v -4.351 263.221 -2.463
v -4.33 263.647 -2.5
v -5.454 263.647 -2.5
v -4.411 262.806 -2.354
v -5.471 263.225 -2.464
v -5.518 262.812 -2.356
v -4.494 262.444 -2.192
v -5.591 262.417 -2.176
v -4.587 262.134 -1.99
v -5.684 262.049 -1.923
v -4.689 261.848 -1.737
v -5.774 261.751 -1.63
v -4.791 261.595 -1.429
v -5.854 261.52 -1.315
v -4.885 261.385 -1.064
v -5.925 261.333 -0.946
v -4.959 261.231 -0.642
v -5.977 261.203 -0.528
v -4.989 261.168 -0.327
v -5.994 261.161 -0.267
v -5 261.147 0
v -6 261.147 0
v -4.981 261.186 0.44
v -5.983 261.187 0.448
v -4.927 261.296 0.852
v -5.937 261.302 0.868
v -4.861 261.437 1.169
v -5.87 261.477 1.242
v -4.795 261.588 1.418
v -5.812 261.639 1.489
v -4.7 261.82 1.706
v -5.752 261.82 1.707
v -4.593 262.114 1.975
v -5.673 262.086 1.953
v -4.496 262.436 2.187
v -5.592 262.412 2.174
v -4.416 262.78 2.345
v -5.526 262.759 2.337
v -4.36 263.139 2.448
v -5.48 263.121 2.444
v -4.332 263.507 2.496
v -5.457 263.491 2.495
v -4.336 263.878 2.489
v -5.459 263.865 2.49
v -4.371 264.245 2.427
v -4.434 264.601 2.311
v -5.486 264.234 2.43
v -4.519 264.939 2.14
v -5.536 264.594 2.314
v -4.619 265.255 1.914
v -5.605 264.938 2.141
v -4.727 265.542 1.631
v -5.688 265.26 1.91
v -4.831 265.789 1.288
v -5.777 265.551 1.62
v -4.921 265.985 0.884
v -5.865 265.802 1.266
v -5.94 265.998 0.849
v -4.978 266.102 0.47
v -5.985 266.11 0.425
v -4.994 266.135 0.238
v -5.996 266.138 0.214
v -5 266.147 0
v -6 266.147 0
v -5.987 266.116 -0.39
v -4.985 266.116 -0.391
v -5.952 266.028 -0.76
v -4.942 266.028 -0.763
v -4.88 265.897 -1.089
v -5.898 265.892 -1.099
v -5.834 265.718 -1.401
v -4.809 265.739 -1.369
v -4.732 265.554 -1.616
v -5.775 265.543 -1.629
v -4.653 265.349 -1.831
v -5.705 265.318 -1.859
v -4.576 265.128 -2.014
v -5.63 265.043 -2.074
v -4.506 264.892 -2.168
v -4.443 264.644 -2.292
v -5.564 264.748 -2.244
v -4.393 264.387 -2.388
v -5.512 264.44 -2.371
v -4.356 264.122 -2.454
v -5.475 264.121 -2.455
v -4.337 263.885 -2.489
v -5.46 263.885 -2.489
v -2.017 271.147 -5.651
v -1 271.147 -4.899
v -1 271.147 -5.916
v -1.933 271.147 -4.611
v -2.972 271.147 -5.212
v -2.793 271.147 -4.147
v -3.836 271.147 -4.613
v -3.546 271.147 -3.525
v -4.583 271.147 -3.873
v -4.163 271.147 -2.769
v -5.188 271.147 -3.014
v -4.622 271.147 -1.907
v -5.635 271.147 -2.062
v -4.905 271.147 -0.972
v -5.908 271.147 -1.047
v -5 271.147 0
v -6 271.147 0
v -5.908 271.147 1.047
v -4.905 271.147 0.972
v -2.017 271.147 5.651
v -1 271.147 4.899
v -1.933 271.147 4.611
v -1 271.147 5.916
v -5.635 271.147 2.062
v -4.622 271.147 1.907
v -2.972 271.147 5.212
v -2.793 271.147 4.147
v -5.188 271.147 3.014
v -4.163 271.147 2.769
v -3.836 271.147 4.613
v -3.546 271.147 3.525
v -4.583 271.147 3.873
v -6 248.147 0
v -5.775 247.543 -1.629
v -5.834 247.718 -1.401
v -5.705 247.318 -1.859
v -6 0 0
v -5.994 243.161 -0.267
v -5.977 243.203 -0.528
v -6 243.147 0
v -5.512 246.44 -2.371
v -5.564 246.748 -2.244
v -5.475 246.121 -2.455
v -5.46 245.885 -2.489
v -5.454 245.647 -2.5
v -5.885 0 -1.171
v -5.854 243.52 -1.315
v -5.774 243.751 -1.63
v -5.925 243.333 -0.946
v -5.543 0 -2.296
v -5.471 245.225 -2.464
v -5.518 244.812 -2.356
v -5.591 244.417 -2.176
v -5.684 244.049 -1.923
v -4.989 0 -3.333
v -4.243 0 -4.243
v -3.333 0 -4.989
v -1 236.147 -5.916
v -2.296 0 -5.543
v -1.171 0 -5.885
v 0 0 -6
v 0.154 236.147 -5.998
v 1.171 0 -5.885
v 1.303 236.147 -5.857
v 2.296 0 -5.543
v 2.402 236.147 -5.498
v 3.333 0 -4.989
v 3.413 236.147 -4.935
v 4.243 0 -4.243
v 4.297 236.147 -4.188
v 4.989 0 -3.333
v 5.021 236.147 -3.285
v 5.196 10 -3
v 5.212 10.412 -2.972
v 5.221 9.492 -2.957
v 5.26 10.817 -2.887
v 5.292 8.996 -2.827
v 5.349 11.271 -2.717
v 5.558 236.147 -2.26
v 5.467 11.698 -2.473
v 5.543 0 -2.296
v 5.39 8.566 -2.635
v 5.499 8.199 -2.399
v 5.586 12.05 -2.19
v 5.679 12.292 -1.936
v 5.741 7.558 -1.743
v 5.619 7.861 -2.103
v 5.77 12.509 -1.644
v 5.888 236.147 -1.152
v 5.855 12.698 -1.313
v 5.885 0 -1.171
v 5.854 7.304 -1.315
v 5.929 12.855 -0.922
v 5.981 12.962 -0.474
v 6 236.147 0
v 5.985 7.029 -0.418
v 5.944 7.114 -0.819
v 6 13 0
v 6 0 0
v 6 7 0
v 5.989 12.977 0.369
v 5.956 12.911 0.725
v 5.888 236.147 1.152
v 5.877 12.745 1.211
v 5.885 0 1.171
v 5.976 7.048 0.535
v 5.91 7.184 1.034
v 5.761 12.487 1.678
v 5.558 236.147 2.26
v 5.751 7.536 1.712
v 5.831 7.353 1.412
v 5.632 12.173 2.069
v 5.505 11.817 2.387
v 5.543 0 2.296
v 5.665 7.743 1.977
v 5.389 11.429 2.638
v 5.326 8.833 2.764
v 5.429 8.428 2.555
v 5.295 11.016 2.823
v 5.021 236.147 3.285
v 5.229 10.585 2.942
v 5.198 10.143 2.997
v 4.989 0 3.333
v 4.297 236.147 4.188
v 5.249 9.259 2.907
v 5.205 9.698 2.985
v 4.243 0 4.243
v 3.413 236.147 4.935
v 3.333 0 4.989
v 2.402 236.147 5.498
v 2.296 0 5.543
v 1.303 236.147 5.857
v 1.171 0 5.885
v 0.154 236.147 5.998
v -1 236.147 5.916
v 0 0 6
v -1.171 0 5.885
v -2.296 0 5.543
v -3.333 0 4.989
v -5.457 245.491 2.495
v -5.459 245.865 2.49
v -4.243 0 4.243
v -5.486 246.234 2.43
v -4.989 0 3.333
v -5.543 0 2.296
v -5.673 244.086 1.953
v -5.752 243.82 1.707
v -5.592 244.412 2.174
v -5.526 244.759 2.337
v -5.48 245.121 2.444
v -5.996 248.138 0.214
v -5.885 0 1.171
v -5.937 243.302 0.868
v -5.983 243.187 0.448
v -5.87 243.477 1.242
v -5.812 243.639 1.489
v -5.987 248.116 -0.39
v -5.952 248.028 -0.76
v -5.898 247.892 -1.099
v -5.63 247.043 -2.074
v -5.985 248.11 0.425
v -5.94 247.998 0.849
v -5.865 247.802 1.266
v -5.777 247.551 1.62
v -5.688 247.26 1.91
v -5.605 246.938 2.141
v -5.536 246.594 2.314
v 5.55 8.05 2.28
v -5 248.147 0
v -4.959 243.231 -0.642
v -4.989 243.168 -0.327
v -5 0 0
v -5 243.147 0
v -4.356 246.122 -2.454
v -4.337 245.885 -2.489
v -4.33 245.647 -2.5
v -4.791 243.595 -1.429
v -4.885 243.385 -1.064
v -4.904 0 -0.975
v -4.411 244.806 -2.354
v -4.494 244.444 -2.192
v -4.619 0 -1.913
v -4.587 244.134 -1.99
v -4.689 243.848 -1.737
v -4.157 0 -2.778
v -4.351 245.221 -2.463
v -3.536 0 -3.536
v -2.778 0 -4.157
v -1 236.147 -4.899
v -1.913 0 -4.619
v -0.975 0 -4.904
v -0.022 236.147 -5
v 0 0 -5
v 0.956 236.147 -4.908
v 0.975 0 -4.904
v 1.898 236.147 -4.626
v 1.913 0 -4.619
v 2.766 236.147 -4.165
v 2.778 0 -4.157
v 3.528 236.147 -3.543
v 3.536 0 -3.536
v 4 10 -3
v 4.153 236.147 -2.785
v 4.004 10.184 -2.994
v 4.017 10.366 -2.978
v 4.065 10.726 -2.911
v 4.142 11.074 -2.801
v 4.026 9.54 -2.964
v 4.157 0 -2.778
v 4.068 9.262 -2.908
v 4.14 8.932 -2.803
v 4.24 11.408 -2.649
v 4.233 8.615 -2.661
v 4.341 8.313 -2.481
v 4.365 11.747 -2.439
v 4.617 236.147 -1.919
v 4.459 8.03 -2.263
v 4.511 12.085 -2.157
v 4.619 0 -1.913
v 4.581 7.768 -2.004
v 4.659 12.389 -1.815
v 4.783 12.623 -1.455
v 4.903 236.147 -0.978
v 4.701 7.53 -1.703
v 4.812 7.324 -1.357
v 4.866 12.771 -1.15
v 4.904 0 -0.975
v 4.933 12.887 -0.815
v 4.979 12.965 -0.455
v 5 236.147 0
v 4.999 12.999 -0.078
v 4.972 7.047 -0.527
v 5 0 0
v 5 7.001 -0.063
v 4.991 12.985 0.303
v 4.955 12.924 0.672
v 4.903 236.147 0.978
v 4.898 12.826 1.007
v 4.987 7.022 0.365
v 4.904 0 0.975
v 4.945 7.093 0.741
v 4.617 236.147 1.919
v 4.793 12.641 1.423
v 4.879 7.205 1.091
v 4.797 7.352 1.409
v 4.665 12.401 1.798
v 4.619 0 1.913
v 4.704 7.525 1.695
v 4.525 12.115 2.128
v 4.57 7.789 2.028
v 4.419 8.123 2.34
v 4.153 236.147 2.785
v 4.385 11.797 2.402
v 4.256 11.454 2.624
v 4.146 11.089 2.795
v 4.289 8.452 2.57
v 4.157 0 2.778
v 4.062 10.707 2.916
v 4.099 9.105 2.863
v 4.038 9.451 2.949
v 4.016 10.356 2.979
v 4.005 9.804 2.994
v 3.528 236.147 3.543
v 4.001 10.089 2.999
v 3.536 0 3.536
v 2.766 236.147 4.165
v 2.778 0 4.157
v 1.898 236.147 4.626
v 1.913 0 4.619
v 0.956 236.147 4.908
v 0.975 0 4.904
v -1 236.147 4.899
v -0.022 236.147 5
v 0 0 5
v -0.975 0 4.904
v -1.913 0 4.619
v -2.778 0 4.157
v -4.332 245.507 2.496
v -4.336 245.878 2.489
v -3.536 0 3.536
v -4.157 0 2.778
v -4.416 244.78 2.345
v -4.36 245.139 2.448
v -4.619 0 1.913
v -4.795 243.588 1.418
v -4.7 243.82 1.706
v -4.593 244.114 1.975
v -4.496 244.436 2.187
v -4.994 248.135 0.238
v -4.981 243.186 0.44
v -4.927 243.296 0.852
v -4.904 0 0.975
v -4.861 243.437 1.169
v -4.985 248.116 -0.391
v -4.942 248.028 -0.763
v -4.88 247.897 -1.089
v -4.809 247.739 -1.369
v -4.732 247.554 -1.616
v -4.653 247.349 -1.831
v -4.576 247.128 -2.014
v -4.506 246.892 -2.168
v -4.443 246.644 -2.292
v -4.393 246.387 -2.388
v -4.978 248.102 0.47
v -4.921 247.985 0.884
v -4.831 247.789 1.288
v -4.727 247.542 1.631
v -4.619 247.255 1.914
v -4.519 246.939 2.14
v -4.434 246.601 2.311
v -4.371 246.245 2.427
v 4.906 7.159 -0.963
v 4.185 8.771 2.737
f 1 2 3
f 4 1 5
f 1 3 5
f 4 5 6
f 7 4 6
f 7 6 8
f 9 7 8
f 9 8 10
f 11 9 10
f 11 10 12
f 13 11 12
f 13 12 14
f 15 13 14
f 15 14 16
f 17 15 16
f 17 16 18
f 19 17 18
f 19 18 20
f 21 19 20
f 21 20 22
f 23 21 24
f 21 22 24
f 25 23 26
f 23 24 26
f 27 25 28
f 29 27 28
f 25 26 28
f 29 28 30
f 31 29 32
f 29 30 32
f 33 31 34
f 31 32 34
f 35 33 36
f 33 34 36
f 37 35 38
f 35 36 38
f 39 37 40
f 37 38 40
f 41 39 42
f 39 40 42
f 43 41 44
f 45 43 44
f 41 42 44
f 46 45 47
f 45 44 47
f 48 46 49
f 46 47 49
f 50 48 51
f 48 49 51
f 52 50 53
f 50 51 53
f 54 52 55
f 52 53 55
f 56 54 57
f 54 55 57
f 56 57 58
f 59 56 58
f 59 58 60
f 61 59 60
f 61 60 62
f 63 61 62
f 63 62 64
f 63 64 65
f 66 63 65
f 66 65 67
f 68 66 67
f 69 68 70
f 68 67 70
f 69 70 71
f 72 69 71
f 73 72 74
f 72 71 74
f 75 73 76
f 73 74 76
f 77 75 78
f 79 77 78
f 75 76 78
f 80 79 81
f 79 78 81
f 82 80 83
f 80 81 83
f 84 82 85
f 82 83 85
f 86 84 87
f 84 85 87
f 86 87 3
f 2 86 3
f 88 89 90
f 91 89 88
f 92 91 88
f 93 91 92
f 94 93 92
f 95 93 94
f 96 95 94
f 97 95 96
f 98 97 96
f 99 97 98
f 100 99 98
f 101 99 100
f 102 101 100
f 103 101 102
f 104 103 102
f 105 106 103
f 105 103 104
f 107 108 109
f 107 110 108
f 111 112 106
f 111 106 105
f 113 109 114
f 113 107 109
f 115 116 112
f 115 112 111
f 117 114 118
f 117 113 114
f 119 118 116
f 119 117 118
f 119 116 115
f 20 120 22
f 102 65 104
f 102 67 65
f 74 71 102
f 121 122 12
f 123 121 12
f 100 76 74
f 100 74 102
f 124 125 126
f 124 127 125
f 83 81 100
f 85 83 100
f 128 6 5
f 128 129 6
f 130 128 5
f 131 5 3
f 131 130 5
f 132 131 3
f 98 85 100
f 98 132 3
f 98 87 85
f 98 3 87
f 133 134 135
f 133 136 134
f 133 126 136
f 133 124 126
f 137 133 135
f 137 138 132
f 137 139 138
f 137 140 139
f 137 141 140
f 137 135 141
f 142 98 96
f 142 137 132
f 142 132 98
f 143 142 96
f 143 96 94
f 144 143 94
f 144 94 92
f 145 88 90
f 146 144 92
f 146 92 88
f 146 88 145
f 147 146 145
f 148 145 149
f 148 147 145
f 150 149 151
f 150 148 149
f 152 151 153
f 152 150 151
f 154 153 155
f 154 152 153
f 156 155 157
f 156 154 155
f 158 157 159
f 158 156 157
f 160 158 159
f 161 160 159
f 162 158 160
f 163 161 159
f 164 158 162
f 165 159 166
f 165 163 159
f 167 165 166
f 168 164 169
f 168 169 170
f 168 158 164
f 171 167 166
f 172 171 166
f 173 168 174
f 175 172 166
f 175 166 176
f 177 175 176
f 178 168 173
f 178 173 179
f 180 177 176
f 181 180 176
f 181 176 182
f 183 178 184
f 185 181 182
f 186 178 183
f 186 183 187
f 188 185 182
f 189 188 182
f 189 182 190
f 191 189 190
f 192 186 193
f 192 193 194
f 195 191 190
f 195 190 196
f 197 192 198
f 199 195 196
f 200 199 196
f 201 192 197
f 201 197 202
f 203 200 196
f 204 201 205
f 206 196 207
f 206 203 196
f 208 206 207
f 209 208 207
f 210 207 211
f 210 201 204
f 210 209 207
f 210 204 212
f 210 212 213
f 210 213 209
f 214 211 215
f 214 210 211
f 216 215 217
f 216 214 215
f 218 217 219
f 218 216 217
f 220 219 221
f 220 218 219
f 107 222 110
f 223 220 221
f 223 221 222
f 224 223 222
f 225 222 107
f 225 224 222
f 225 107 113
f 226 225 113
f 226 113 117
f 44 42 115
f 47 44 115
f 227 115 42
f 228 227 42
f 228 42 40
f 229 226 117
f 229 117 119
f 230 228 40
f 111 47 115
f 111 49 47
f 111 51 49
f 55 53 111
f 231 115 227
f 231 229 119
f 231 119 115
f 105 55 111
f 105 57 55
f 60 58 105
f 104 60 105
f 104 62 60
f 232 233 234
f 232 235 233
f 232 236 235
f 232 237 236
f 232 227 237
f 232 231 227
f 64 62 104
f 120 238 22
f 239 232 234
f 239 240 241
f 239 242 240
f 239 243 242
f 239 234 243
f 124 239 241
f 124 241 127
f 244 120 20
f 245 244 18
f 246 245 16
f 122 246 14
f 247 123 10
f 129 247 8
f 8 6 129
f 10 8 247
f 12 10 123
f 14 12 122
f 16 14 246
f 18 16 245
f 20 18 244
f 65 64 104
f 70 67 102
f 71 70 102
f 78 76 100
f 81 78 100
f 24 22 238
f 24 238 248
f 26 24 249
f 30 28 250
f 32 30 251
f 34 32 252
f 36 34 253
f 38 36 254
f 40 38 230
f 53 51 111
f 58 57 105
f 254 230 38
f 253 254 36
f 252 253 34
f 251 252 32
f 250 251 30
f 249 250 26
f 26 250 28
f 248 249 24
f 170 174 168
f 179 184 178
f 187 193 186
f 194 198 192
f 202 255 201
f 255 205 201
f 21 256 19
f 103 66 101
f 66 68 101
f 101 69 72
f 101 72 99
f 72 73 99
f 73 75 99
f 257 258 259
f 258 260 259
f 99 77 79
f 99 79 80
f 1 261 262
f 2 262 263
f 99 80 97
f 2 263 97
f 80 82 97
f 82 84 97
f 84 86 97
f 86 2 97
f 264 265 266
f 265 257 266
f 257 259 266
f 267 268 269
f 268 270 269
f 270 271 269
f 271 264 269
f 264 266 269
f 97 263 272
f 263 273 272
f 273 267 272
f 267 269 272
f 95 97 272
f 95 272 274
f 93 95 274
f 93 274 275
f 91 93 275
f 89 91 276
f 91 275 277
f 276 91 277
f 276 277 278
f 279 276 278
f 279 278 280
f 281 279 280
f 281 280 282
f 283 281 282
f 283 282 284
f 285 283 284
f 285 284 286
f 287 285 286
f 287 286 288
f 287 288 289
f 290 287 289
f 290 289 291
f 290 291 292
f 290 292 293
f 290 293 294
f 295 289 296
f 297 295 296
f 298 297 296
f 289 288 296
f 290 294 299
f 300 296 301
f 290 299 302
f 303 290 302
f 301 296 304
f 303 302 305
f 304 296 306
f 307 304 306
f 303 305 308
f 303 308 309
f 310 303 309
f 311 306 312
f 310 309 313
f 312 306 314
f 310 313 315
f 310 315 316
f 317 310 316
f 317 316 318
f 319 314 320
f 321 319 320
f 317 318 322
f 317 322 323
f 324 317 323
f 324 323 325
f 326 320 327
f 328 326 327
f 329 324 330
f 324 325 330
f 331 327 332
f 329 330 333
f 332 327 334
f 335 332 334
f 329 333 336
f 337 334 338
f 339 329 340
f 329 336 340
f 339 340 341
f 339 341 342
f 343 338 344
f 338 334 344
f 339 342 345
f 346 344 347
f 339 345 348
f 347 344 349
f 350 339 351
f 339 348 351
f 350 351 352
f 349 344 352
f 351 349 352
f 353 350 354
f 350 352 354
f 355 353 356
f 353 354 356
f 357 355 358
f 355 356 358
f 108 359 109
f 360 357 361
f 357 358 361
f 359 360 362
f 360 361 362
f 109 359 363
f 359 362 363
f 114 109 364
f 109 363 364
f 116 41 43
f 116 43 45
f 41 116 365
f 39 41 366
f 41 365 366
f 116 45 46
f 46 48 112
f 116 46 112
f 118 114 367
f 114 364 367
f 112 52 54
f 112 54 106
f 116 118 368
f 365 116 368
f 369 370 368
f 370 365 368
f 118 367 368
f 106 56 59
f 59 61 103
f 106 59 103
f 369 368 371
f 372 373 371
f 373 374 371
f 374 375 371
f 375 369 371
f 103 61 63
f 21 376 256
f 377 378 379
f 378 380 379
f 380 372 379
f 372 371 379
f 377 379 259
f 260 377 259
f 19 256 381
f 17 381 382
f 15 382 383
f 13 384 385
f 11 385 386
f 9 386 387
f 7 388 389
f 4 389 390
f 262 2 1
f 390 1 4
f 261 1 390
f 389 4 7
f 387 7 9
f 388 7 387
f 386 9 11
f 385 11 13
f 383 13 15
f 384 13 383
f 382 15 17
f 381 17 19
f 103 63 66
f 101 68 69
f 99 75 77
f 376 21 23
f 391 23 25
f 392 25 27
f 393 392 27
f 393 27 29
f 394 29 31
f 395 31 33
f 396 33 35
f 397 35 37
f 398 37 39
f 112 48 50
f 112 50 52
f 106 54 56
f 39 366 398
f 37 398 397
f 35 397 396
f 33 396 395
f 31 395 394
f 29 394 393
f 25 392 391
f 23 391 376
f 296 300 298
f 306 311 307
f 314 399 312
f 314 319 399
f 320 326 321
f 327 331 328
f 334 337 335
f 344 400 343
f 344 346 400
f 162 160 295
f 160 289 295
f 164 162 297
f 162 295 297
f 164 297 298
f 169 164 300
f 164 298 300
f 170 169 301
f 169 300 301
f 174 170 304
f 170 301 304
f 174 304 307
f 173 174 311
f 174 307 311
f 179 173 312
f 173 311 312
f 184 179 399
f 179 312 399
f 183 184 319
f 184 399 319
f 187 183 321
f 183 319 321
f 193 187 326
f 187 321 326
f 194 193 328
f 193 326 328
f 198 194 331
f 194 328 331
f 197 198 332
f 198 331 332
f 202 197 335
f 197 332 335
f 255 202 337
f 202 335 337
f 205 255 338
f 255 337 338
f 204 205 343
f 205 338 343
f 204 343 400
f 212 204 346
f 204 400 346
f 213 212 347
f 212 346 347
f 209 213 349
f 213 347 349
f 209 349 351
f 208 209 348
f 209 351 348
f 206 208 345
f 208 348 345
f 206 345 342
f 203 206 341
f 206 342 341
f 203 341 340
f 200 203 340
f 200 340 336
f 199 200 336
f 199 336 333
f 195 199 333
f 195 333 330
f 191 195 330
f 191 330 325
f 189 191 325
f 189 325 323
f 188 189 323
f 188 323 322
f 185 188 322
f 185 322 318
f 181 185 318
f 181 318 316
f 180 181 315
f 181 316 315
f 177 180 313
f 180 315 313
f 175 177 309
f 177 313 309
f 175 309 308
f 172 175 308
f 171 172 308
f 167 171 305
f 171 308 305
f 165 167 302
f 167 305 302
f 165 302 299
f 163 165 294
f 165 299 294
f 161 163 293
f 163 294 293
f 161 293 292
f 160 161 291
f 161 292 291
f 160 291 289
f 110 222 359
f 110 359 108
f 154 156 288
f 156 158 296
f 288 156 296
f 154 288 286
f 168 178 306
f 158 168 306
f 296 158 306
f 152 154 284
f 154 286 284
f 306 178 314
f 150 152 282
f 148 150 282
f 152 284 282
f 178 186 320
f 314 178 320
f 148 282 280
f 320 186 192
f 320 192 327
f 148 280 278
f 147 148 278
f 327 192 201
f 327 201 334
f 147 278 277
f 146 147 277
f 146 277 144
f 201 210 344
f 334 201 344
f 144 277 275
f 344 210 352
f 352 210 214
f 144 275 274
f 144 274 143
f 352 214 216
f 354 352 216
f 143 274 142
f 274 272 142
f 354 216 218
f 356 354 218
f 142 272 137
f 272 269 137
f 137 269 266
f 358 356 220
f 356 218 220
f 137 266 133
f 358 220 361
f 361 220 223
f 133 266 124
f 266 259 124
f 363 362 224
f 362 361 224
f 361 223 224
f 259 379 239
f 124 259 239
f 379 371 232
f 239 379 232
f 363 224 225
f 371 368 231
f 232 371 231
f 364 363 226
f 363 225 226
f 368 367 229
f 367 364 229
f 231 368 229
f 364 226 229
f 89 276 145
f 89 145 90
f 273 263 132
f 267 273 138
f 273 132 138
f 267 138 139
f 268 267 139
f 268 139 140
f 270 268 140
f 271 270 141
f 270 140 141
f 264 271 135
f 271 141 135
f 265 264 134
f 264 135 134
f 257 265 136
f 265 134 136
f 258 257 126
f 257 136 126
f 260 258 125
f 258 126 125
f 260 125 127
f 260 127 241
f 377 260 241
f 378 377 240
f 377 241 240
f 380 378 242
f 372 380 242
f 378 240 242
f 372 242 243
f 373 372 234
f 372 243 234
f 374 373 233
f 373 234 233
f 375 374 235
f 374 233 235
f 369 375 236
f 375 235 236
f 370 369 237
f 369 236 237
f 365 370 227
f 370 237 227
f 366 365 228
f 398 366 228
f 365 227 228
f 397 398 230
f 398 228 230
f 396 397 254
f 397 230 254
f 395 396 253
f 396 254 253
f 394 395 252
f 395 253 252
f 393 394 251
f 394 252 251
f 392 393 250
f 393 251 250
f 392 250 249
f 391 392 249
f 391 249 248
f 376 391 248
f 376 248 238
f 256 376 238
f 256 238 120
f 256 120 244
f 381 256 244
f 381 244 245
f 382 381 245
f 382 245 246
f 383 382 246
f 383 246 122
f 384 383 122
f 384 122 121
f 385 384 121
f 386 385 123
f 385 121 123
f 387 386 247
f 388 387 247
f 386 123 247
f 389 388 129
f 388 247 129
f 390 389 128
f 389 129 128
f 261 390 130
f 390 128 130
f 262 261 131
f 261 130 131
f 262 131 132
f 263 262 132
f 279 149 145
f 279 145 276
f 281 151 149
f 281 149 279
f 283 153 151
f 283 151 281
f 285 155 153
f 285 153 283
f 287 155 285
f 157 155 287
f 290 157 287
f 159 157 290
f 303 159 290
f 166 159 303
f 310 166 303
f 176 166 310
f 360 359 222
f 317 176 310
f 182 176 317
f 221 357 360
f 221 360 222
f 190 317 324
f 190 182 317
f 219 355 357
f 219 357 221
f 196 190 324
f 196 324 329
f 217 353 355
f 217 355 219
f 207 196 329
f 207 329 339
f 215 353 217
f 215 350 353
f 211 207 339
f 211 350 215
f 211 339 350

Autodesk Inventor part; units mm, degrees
ref_plane "XZ Plane" through (0, 0, 0) normal (0, 1, 0) x (-1, 0, 0)
ref_plane "XY Plane" through (0, 0, 0) normal (0, 0, 1) x (1, 0, 0)
sketch "Sketch1" plane through (0, 0, 0) normal (0, 1, 0) x (-1, 0, 0)
  circle A0 centre (0, 0) radius 5
  circle A1 centre (0, 0) radius 6
  dimension "d1" = 1
  dimension "d34" = 10
extrude "Extrusion1" add sketch "Sketch1" along normal blind 271.1467
ref_plane "Work Plane3" through (6, 0, 0) normal (1, 0, 0) x (0, 1, 0)
sketch "Sketch2" plane through (6, 0, 0) normal (1, 0, 0) x (0, 1, 0)
  line L0 (0, -6) -> (271.1467, -6) projected
  line L1 (0, 6) -> (271.1467, 6) projected
  line L2 (271.1467, -6) -> (271.1467, 6) projected
  line L3 (-54.2293, 0) -> (325.3761, 0) projected
  point P0 (0, 0)
  point P1 (10, 0)
  point P2 (271.1467, 0)
  dimension "d20" = 10
hole "Hole1" at (6, 10, 0) direction (-1, 0, 0) diameter 6 end up to surface
sketch "Sketch3" plane through (6, 0, 0) normal (1, 0, 0) x (0, 1, 0)
  line L0 (-54.2293, 0) -> (325.3761, 0) projected
  line L1 (271.1467, -6) -> (271.1467, 6) projected
  line L2 (236.1467, 6) -> (271.1467, 6)
  line L3 (271.1467, 6) -> (271.1467, -6)
  line L4 (271.1467, -6) -> (236.1467, -6)
  line L5 (236.1467, -6) -> (236.1467, 6)
  point P0 (0, 0)
  point P1 (245.6467, 0)
  point P2 (263.6467, 0)
  dimension "d22" = 7.5
  dimension "d23" = 18
  dimension "d24" = 35
extrude "Extrusion2" cut sketch "Sketch3" against normal blind 7
hole "Hole3" at (6, 263.6467, 0) at (6, 245.6467, 0) direction (-1, 0, 0) diameter 5 end through all
equation "\"d1\" = pipe_thickness"
equation "\"d34\" = pipe_inner_diameter"
equation "\"d2\" = pipe_length"
equation "\"d24\" = bar_connection"
equation "\"d25\" = pipe_cutout"
equation "\"pipe_length\" = connector_min_length - bar_connection"
equation "\"alfa\" = 45deg"
equation "\"bar_connection\" = 35"
equation "\"pipe_cutout\" = 7"
equation "\"pipe_inner_diameter\" = 10"
equation "\"pipe_thickness\" = 1"
equation "\"pipe_outer_diameter\" = pipe_inner_diameter + 2 * pipe_thickness"
equation "\"connector_min_length\" = 306.146746"
properties part number "pipe" material "Aluminum 6061"
